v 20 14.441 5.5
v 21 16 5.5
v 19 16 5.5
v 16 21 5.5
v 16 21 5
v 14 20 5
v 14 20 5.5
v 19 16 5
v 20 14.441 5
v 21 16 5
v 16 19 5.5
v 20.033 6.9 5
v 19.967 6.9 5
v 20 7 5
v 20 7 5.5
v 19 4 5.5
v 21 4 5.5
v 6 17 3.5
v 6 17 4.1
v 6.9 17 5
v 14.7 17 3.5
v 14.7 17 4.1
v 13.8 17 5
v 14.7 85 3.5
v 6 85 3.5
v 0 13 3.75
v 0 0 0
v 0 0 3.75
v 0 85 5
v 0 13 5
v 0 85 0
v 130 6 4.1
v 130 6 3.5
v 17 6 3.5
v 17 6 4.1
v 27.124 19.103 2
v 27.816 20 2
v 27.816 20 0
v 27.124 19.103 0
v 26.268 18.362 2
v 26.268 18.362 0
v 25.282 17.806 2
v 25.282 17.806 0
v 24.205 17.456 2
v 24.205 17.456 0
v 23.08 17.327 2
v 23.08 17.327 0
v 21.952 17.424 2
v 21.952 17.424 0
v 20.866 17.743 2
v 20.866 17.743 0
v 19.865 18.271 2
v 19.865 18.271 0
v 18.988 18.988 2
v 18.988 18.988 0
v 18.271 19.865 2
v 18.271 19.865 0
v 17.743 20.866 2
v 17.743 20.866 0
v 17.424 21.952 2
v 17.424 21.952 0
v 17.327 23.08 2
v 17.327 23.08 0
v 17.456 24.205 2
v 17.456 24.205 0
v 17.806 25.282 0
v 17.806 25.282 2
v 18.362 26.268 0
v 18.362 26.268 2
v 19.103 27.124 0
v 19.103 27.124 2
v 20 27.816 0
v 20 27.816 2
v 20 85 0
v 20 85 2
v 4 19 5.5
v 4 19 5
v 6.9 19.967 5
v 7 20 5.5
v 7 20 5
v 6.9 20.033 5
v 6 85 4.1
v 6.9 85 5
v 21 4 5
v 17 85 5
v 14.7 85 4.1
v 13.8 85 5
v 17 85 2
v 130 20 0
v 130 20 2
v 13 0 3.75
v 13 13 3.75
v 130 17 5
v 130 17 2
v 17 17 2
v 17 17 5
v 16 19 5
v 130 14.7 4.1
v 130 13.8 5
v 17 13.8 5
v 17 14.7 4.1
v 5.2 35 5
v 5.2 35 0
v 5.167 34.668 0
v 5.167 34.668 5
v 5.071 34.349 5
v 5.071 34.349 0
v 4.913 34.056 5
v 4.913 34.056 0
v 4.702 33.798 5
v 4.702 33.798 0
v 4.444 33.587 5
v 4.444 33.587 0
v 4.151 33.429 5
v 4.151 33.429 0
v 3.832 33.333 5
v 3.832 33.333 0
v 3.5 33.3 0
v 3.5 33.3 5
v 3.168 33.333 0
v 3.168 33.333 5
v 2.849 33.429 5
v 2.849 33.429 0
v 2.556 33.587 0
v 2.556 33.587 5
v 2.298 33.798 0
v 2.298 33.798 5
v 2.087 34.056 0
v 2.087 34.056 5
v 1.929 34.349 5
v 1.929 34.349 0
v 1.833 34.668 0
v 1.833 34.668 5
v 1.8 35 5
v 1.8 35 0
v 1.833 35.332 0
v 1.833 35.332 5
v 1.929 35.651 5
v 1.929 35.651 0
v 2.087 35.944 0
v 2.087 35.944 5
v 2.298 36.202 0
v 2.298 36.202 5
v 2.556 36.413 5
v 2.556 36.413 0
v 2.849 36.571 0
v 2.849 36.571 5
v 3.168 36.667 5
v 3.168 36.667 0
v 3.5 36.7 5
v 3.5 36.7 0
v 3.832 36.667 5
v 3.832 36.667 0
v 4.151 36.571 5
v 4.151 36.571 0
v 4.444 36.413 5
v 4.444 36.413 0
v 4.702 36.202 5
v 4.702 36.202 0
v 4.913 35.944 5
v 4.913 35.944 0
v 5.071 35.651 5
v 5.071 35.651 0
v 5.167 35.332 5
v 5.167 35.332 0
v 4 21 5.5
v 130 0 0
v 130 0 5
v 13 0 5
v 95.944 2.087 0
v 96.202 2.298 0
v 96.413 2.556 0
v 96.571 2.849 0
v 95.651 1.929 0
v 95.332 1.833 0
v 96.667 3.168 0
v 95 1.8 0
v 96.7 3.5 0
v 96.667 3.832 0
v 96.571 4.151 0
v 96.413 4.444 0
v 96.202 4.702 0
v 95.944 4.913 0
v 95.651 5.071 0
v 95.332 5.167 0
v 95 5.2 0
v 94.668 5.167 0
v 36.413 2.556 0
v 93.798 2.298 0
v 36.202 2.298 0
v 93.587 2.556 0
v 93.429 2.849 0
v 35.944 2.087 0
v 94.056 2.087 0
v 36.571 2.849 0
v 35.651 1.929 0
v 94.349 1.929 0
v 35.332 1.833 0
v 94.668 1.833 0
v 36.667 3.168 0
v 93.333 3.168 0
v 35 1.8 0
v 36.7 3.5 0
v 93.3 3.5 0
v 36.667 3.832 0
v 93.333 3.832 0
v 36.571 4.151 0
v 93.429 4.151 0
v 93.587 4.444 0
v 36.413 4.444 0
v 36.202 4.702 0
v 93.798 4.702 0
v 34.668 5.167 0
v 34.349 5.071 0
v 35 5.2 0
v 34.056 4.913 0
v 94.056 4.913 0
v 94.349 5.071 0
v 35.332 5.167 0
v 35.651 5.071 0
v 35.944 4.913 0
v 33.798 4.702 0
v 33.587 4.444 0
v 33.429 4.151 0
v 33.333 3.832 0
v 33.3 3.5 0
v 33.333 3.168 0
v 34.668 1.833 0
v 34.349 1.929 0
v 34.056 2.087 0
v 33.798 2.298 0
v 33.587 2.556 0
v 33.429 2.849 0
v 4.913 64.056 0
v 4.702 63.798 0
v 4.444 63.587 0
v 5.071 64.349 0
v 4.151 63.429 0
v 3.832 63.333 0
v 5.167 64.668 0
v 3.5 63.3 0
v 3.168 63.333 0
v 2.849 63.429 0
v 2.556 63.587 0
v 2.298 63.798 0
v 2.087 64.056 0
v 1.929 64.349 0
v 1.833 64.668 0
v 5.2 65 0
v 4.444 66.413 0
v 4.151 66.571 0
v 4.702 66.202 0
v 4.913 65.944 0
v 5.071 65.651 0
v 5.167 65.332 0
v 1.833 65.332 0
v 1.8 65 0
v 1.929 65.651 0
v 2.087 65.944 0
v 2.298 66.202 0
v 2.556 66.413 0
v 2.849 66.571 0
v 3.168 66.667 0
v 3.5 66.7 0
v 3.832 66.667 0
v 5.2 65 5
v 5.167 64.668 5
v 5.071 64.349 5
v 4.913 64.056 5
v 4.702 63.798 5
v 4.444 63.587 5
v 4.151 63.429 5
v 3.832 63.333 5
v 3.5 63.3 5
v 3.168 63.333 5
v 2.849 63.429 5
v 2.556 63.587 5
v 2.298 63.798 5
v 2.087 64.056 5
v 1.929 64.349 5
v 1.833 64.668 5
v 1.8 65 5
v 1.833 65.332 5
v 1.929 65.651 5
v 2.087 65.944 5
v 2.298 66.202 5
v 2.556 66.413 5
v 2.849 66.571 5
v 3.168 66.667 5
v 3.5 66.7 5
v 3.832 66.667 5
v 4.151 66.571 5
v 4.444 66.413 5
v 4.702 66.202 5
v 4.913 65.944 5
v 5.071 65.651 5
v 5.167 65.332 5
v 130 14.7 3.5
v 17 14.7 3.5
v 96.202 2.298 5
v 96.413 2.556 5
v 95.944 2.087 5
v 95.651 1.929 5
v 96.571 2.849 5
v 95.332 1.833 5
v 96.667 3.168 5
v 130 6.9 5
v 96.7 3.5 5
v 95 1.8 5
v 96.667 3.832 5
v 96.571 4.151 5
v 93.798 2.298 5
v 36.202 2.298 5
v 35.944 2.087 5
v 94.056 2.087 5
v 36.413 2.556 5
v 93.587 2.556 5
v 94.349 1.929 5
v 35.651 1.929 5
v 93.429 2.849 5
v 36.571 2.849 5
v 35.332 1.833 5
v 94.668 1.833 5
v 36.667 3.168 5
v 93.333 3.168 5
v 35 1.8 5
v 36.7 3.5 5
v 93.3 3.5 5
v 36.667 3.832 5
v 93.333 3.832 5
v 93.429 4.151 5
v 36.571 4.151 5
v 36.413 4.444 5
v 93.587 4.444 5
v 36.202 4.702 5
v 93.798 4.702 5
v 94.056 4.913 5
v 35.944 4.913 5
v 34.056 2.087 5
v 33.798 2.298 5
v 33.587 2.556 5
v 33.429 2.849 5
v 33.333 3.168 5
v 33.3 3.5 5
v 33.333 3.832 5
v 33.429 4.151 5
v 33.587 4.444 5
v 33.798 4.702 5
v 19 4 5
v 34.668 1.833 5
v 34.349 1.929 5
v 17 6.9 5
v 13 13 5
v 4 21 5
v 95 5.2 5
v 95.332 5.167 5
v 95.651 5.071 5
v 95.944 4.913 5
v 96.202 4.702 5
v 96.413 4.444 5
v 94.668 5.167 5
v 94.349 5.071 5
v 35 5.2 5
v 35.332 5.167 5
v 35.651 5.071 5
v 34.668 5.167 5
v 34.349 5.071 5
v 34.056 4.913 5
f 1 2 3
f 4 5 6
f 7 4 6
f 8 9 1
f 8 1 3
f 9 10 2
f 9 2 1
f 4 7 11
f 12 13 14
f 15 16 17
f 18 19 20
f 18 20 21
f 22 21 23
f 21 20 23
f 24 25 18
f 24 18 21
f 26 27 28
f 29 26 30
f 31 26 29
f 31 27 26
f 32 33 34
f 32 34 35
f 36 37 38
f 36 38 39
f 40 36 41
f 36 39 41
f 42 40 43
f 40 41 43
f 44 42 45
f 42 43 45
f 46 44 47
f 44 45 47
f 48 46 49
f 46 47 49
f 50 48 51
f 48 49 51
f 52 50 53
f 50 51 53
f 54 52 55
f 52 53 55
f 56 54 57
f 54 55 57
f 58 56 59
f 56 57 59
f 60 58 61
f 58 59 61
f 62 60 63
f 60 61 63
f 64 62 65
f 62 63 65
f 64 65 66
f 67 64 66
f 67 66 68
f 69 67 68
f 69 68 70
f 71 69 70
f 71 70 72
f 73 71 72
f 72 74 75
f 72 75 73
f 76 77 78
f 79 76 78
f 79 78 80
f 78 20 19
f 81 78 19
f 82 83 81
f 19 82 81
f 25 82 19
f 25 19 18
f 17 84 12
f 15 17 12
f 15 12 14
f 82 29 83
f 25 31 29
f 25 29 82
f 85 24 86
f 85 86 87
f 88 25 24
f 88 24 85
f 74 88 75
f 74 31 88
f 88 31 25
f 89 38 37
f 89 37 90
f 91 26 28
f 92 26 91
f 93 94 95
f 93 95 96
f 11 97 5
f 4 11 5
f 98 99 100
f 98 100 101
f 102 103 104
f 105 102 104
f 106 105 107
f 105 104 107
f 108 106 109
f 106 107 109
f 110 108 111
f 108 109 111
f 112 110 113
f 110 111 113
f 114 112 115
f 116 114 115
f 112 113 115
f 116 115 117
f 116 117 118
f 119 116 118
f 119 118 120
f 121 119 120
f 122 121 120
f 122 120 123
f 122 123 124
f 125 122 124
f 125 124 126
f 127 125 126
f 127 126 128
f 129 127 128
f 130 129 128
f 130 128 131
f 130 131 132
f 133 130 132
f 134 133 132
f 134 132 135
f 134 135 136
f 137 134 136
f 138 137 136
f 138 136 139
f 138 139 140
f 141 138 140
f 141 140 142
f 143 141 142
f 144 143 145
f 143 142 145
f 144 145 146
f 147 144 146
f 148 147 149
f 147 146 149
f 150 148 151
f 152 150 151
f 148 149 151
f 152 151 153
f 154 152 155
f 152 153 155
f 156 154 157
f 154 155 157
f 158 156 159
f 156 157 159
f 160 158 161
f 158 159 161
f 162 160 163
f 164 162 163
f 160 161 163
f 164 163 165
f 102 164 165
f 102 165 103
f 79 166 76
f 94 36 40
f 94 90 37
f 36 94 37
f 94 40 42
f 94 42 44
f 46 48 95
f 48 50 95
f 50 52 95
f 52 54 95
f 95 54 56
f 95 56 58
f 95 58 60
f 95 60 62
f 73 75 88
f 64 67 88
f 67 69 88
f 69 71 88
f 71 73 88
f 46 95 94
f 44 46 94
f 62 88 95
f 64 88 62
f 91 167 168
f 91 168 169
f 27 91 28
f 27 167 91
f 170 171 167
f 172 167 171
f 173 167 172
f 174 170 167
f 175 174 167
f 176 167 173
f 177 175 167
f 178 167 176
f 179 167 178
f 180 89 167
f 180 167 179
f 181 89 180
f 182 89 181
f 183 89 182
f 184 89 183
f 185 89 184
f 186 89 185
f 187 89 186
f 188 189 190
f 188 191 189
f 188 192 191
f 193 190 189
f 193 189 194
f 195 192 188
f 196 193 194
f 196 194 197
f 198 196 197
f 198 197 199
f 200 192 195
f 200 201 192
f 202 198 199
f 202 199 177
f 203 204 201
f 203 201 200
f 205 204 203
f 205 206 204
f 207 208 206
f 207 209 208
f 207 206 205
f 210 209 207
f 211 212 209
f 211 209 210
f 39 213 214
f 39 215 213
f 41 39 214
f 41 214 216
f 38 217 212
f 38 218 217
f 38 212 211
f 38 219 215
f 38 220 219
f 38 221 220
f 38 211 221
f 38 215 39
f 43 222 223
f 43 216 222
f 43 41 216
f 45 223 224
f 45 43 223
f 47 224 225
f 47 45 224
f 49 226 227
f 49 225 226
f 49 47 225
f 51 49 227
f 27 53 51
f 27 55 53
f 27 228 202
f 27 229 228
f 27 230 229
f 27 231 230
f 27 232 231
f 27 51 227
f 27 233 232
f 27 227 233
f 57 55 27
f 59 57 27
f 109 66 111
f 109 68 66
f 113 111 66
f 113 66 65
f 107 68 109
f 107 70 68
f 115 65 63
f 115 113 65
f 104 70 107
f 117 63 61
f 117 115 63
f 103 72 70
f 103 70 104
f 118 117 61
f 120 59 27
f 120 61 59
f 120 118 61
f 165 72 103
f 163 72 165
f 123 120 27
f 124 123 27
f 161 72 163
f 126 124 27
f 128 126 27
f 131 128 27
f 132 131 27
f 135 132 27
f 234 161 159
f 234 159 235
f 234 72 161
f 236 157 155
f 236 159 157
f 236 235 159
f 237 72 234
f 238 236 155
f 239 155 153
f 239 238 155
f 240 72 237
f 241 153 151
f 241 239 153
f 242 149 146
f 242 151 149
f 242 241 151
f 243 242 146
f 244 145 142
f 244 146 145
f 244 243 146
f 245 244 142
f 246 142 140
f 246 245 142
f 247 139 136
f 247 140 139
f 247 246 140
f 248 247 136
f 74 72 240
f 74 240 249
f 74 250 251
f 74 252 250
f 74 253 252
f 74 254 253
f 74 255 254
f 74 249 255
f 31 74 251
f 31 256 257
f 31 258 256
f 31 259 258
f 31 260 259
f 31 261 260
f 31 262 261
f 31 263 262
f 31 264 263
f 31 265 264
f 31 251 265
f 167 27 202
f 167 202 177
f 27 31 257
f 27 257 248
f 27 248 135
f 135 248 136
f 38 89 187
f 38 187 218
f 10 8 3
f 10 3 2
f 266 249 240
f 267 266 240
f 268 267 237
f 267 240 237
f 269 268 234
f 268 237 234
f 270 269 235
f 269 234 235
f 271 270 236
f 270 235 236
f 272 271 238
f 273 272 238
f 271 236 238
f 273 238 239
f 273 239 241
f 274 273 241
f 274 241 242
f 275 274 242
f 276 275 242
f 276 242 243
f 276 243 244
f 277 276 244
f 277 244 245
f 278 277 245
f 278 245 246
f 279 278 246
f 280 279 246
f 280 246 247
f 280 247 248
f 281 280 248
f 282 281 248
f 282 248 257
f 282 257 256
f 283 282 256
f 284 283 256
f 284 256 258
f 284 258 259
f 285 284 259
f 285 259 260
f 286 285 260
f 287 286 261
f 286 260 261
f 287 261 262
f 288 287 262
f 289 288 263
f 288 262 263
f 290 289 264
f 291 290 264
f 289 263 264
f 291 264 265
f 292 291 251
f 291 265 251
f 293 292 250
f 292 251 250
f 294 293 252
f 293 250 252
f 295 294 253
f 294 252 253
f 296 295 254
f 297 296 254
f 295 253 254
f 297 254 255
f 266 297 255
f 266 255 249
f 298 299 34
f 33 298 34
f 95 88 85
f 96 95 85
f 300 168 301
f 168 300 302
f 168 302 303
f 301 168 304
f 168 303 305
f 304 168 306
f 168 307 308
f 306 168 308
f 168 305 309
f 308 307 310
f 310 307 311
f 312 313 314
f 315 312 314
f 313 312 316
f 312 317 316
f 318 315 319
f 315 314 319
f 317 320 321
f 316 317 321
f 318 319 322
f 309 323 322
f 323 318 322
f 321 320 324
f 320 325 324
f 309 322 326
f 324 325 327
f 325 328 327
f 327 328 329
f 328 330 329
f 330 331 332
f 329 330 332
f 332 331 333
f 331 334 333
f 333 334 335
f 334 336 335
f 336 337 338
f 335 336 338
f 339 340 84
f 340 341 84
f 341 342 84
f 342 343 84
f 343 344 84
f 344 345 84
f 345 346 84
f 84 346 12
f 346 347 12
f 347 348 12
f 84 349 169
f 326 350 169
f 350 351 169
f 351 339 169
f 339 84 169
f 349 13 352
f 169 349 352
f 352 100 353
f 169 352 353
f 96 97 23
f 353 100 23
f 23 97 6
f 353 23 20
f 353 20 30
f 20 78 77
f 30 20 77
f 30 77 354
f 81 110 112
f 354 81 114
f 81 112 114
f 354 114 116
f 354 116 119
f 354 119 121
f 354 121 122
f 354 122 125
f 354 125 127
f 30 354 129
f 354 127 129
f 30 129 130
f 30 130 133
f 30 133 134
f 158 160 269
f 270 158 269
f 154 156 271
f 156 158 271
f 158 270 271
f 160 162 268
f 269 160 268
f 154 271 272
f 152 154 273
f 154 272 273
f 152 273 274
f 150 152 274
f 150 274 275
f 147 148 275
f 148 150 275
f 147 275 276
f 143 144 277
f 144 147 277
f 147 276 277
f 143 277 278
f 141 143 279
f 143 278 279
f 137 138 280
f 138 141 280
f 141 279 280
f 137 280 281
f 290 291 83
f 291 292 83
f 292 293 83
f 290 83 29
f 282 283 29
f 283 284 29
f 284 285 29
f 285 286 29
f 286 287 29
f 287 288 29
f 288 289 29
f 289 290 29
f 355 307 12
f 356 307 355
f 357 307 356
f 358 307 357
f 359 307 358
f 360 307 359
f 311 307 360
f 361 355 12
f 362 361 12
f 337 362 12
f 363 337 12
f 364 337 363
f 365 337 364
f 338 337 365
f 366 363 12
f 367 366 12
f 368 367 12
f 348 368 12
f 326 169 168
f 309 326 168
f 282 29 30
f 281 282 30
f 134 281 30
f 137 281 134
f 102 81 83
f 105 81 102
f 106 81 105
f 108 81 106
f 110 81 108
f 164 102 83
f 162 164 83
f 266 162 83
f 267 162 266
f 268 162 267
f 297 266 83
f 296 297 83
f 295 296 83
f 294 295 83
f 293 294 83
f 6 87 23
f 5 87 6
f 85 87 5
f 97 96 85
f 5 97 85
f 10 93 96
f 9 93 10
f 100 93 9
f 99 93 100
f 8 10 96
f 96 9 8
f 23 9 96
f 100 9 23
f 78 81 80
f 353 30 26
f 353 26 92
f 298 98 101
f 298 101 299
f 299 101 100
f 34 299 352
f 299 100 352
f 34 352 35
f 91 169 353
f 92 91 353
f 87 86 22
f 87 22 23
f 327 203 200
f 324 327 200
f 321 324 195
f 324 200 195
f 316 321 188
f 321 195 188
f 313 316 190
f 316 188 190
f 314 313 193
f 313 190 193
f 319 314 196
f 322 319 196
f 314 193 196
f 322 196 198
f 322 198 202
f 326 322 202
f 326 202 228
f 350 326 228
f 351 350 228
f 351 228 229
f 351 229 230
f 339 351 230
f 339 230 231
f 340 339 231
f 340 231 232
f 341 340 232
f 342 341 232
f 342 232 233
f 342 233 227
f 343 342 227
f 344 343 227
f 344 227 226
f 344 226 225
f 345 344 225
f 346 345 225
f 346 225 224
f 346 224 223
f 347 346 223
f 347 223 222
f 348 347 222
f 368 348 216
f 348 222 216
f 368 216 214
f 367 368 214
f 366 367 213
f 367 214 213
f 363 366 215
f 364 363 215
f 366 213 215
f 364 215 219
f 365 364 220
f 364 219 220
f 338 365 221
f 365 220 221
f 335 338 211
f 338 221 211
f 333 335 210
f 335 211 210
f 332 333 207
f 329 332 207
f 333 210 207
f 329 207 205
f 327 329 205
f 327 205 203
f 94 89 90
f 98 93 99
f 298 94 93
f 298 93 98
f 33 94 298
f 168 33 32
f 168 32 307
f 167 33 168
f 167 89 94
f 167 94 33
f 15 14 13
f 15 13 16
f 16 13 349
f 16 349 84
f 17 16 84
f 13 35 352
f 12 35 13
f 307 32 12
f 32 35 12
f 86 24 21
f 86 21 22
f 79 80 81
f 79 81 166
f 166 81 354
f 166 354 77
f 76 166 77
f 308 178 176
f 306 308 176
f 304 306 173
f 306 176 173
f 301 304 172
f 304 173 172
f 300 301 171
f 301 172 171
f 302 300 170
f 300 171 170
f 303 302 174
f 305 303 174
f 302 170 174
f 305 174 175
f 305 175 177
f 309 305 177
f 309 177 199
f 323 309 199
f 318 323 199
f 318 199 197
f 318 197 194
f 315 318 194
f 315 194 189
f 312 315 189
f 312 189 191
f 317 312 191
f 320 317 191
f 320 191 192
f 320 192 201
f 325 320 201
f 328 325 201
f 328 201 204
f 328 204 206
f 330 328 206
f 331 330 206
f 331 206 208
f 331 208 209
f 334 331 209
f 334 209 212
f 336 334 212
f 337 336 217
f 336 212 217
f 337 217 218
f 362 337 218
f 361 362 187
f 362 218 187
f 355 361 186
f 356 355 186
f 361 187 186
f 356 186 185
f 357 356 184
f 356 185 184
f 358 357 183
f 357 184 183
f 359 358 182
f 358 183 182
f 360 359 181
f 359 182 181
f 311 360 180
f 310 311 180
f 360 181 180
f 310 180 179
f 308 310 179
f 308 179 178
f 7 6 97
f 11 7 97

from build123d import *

# Parameters (mm, degrees)
PAD_DEPTH       = 5
POCKET_DEPTH    = 113
SKETCH002_W     = 4
SKETCH002_H     = 4
POCKET001_DEPTH = 113
SKETCH003_W     = 3.38924
SKETCH003_H     = 4
POCKET002_DEPTH = 68
POCKET003_DEPTH = 68
SKETCH005_W     = 14
SKETCH005_H     = 14
POCKET004_DEPTH = 1.25
PAD001_DEPTH    = 0.5
SKETCH007_R     = 5.673714
POCKET005_DEPTH = 5
SKETCH008_R     = 1.7
POCKET006_DEPTH = 5.501


with BuildPart() as part:
    # Sketch → Pad (new body)
    with BuildSketch(Plane.XY):
        Polygon((0, 0), (0, 85), (20, 85), (20, 20), (130, 20), (130, 0), align=None)
    extrude(amount=PAD_DEPTH)

    # Sketch001 → Pocket (cut)
    with BuildSketch(Plane.YZ.offset(130)):
        Polygon((6, 3.5), (6, 4.1), (8.557521, 6.657521), (12.142479, 6.657521), (14.7, 4.1), (14.7, 3.5), align=None)
    extrude(amount=-POCKET_DEPTH, mode=Mode.SUBTRACT)

    # Sketch002 → Pocket001 (cut)
    with BuildSketch(Plane.YZ.offset(130)):
        with Locations((19, 4)):
            Rectangle(SKETCH002_W, SKETCH002_H)
    extrude(amount=-POCKET001_DEPTH, mode=Mode.SUBTRACT)

    # Sketch003 → Pocket002 (cut)
    with BuildSketch(Plane(origin=(0, 85, 0), x_dir=(-1, 0, 0), z_dir=(0, 1, 0))):
        with Locations((-18.69462, 4)):
            Rectangle(SKETCH003_W, SKETCH003_H)
    extrude(amount=-POCKET002_DEPTH, mode=Mode.SUBTRACT)

    # Sketch004 → Pocket003 (cut)
    with BuildSketch(Plane(origin=(0, 85, 0), x_dir=(-1, 0, 0), z_dir=(0, 1, 0))):
        Polygon((-14.7, 3.5), (-14.7, 4.1), (-13.019806, 5.780194), (-7.680194, 5.780194), (-6, 4.1), (-6, 3.5), align=None)
    extrude(amount=-POCKET003_DEPTH, mode=Mode.SUBTRACT)

    # Sketch005 → Pocket004 (cut)
    with BuildSketch(Plane.XY.offset(5)):
        with Locations((6, 6)):
            Rectangle(SKETCH005_W, SKETCH005_H)
    extrude(amount=-POCKET004_DEPTH, mode=Mode.SUBTRACT)

    # Sketch006 → Pad001 (new body)
    with BuildSketch(Plane.XY.offset(5)):
        Polygon((20, 7), (19, 4), (21, 4), align=None)
        Polygon((20, 14.44055), (19, 16), (21, 16), align=None)
        Polygon((14, 20), (16, 19), (16, 21), align=None)
        Polygon((7, 20), (4, 21), (4, 19), align=None)
    extrude(amount=PAD001_DEPTH)

    # Sketch007 → Pocket005 (cut)
    with BuildSketch(Plane(origin=(0, 0, 0), x_dir=(1, 0, 0), z_dir=(0, 0, -1))):
        with Locations((23, -23)):
            Circle(SKETCH007_R)
    extrude(amount=-POCKET005_DEPTH, mode=Mode.SUBTRACT)

    # Sketch008 → Pocket006 (cut, through all)
    with BuildSketch(Plane(origin=(0, 0, 0), x_dir=(1, 0, 0), z_dir=(0, 0, -1))):
        with Locations((35, -3.5)):
            Circle(SKETCH008_R)
        with Locations((95, -3.5)):
            Circle(SKETCH008_R)
        with Locations((3.5, -35)):
            Circle(SKETCH008_R)
        with Locations((3.5, -65)):
            Circle(SKETCH008_R)
    extrude(amount=-POCKET006_DEPTH, mode=Mode.SUBTRACT)


solid = part.part
